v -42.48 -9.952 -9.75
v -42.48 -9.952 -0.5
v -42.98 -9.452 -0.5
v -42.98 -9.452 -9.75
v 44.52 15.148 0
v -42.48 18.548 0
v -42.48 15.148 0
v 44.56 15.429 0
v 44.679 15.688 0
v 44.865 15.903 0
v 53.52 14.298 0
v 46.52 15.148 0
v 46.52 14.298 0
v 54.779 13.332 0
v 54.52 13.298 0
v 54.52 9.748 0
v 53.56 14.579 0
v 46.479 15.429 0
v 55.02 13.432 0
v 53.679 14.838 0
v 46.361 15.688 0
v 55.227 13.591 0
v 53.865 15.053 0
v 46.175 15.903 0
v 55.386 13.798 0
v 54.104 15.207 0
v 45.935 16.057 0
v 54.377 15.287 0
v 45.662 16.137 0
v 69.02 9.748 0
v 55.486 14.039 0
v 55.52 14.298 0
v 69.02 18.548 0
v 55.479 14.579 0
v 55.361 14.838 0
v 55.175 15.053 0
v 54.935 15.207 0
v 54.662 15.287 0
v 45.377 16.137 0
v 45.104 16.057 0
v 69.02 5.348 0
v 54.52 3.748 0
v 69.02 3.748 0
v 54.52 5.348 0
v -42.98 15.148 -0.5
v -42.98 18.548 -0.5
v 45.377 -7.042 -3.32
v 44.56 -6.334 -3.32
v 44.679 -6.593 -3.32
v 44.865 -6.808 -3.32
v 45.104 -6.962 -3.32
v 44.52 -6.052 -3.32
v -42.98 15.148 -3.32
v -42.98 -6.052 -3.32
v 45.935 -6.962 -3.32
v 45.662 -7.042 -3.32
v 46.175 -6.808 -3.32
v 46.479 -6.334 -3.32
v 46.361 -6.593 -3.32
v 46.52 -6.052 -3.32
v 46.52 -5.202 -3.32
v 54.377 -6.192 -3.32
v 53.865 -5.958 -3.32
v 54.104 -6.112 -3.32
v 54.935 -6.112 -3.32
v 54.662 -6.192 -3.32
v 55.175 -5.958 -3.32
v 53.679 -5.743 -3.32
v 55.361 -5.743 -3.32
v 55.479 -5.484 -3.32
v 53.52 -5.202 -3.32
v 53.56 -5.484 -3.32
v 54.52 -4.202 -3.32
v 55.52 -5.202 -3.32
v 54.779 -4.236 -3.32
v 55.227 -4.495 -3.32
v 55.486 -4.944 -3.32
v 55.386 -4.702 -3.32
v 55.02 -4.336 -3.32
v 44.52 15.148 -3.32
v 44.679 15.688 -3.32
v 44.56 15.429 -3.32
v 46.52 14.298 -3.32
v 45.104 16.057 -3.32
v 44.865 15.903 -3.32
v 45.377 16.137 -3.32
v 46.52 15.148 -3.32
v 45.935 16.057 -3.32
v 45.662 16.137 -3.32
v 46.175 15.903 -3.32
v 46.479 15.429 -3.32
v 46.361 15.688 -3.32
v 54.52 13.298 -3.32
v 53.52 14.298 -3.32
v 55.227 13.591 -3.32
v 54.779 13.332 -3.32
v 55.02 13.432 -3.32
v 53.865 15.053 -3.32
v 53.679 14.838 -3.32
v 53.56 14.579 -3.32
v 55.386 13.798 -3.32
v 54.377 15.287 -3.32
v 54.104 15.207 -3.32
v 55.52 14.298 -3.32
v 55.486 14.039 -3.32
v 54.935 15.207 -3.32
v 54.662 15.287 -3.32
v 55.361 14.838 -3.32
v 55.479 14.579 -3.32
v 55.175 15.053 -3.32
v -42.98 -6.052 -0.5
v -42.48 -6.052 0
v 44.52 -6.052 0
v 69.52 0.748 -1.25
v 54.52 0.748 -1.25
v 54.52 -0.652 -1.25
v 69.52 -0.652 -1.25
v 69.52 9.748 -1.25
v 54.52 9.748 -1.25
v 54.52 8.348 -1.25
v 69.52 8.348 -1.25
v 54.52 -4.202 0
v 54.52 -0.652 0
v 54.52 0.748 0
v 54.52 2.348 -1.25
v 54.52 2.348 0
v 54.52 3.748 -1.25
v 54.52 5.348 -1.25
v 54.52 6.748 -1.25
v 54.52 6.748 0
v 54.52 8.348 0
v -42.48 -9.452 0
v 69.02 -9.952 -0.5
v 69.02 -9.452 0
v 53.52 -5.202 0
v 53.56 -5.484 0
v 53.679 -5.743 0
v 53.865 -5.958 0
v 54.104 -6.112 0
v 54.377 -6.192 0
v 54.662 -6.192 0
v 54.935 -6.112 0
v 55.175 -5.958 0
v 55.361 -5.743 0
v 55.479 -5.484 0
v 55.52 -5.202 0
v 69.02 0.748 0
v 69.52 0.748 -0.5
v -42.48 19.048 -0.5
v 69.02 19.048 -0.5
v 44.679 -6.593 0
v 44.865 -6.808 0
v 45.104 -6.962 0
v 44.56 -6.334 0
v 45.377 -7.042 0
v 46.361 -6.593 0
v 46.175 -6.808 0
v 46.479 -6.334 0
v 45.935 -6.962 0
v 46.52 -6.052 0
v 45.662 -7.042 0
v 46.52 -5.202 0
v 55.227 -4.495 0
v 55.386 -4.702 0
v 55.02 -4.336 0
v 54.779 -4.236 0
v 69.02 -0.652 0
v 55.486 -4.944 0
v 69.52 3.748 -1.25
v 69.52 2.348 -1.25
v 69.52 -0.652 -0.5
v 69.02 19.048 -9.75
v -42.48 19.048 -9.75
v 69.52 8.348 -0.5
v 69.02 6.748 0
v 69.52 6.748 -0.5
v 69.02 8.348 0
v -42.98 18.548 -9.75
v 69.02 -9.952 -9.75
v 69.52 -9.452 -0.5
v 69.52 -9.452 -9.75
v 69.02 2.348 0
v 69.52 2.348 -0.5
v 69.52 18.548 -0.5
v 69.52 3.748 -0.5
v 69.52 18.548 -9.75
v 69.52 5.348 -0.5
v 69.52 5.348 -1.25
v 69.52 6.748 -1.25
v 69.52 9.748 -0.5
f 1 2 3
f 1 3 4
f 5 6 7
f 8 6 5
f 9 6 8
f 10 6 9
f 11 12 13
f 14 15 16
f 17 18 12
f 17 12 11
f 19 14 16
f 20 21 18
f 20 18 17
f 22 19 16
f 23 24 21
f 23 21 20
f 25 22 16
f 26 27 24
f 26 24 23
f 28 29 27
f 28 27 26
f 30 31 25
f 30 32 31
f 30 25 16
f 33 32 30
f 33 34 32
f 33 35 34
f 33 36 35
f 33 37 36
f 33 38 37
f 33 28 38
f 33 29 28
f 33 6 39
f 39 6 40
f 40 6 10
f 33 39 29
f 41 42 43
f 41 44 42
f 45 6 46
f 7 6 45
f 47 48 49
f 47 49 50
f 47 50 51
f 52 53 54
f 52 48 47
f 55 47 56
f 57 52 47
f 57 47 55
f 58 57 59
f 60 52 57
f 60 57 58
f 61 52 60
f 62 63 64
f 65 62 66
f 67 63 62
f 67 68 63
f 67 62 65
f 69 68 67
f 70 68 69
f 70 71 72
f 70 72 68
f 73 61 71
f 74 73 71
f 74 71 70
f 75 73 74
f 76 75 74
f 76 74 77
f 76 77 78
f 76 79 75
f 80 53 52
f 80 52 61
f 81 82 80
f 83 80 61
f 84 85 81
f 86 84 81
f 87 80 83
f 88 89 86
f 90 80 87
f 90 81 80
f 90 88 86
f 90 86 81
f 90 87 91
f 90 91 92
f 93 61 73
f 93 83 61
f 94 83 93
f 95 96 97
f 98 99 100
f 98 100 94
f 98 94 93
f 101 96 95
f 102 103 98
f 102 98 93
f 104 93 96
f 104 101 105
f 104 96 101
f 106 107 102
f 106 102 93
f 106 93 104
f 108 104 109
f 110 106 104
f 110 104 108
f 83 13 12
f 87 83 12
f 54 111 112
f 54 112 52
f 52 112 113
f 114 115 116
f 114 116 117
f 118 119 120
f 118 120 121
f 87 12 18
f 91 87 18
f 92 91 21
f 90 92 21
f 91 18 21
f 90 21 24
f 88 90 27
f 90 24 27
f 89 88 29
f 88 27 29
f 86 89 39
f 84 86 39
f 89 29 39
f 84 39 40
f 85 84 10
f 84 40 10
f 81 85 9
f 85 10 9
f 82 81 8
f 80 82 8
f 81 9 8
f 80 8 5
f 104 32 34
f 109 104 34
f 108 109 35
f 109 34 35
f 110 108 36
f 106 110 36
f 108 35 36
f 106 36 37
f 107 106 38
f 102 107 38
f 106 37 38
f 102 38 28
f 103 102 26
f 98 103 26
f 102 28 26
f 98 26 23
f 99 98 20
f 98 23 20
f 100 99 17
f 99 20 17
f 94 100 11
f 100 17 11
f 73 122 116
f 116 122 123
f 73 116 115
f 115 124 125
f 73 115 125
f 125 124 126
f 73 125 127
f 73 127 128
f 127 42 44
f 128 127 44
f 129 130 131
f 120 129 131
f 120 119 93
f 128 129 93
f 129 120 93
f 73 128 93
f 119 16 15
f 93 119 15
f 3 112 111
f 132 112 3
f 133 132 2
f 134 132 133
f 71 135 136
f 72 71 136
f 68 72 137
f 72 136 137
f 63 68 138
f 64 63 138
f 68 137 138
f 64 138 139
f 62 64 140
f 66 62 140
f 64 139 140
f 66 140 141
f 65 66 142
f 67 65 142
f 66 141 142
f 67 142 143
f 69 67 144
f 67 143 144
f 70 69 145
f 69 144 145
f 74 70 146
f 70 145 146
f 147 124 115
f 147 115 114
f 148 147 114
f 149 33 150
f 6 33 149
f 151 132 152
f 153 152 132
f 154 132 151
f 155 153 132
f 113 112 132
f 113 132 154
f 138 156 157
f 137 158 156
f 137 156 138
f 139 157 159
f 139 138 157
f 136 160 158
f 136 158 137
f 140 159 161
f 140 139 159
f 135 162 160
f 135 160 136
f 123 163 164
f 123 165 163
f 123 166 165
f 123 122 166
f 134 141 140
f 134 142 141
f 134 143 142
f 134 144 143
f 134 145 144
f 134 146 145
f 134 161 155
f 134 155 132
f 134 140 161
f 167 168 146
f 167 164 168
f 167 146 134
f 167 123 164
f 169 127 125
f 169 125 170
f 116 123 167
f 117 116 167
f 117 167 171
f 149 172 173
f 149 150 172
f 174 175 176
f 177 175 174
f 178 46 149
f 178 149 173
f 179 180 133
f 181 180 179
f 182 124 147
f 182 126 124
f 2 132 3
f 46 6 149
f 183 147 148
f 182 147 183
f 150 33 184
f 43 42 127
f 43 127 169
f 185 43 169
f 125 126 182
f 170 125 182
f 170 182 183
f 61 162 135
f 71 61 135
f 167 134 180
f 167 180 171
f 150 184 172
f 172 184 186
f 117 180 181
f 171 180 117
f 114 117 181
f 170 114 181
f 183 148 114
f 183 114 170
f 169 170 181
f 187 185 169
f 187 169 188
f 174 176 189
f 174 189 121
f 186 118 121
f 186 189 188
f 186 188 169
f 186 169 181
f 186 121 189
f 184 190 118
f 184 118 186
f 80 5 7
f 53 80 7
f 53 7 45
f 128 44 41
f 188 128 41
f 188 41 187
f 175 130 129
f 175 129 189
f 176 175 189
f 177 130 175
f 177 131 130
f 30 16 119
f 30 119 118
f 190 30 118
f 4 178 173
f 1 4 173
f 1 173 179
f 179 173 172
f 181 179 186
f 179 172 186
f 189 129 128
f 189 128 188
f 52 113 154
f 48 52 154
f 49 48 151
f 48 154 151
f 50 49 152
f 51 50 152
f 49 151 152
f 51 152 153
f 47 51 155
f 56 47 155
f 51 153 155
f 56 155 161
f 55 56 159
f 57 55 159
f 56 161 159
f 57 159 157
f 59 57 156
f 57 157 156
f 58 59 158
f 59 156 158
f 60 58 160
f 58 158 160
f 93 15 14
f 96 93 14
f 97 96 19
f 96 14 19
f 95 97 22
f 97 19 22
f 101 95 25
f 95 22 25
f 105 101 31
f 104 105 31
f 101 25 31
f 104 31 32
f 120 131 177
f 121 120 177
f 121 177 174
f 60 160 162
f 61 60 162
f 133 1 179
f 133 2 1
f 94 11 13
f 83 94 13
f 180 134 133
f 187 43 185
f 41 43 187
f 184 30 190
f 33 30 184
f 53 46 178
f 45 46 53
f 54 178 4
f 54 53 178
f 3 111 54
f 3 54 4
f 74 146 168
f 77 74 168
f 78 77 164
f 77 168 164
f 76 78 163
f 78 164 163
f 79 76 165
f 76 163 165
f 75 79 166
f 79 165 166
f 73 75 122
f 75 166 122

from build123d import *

# Parameters (mm, degrees)
F0_W     = 15
F0_H     = 1.4
F0_H_2   = 1.6
F1_DEPTH = 9.75
F2_SIZE  = 0.5
F3_DEPTH = 3.32
F4_DEPTH = 1.25


with BuildPart() as f1:
    # F0 (on Top) → F1 (new body)
    with BuildSketch(Plane.XY):
        with Locations((62.019782, 3.047612)):
            Rectangle(F0_W, F0_H)
        with Locations((62.019782, 6.047612)):
            Rectangle(F0_W, F0_H)
        with Locations((62.019782, 0.047612)):
            Rectangle(F0_W, F0_H)
        with Locations((62.019782, 9.047612)):
            Rectangle(F0_W, F0_H)
        with Locations((62.019782, 4.547612)):
            Rectangle(F0_W, F0_H_2)
        with Locations((62.019782, 1.547612)):
            Rectangle(F0_W, F0_H_2)
        with Locations((62.019782, 7.547612)):
            Rectangle(F0_W, F0_H_2)
        with BuildLine():
            Line((44.519782, 15.147612), (-42.980218, 15.147612))
            Line((-42.980218, 15.147612), (-42.980218, -6.052388))
            Line((-42.980218, -6.052388), (44.519782, -6.052388))
            Line((44.519782, -6.052388), (46.519782, -6.052388))
            Line((46.519782, -6.052388), (46.519782, -5.202388))
            Line((46.519782, -5.202388), (53.519782, -5.202388))
            ThreePointArc((53.519782, -5.202388), (53.812675, -4.495281), (54.519782, -4.202388))
            Line((54.519782, -4.202388), (54.519782, -0.652388))
            Line((54.519782, -0.652388), (54.519782, 0.747612))
            Line((54.519782, 0.747612), (54.519782, 2.347612))
            Line((54.519782, 2.347612), (54.519782, 3.747612))
            Line((54.519782, 3.747612), (54.519782, 5.347612))
            Line((54.519782, 5.347612), (54.519782, 6.747612))
            Line((54.519782, 6.747612), (54.519782, 8.347612))
            Line((54.519782, 8.347612), (54.519782, 9.747612))
            Line((54.519782, 9.747612), (54.519782, 13.297612))
            ThreePointArc((54.519782, 13.297612), (53.812675, 13.590505), (53.519782, 14.297612))
            Line((53.519782, 14.297612), (46.519782, 14.297612))
            Line((46.519782, 14.297612), (46.519782, 15.147612))
            Line((46.519782, 15.147612), (44.519782, 15.147612))
        make_face()
        with BuildLine():
            Line((46.519782, -6.052388), (44.519782, -6.052388))
            ThreePointArc((44.519782, -6.052388), (45.519782, -7.052388), (46.519782, -6.052388))
        make_face()
        with BuildLine():
            ThreePointArc((46.519782, 15.147612), (45.519782, 16.147612), (44.519782, 15.147612))
            Line((44.519782, 15.147612), (46.519782, 15.147612))
        make_face()
        with BuildLine():
            Line((69.519782, 19.047612), (-42.980218, 19.047612))
            Line((-42.980218, 19.047612), (-42.980218, 15.147612))
            Line((-42.980218, 15.147612), (44.519782, 15.147612))
            ThreePointArc((44.519782, 15.147612), (45.519782, 16.147612), (46.519782, 15.147612))
            Line((46.519782, 15.147612), (46.519782, 14.297612))
            Line((46.519782, 14.297612), (53.519782, 14.297612))
            ThreePointArc((53.519782, 14.297612), (54.519782, 15.297612), (55.519782, 14.297612))
            ThreePointArc((55.519782, 14.297612), (55.226889, 13.590505), (54.519782, 13.297612))
            Line((54.519782, 13.297612), (54.519782, 9.747612))
            Line((54.519782, 9.747612), (69.519782, 9.747612))
            Line((69.519782, 9.747612), (69.519782, 19.047612))
        make_face()
        with BuildLine():
            Line((44.519782, -6.052388), (-42.980218, -6.052388))
            Line((-42.980218, -6.052388), (-42.980218, -9.952388))
            Line((-42.980218, -9.952388), (69.519782, -9.952388))
            Line((69.519782, -9.952388), (69.519782, -0.652388))
            Line((69.519782, -0.652388), (54.519782, -0.652388))
            Line((54.519782, -0.652388), (54.519782, -4.202388))
            ThreePointArc((54.519782, -4.202388), (55.226889, -4.495281), (55.519782, -5.202388))
            ThreePointArc((55.519782, -5.202388), (54.519782, -6.202388), (53.519782, -5.202388))
            Line((53.519782, -5.202388), (46.519782, -5.202388))
            Line((46.519782, -5.202388), (46.519782, -6.052388))
            ThreePointArc((46.519782, -6.052388), (45.519782, -7.052388), (44.519782, -6.052388))
        make_face()
        with BuildLine():
            Line((54.519782, -5.202388), (53.519782, -5.202388))
            ThreePointArc((53.519782, -5.202388), (54.519782, -6.202388), (55.519782, -5.202388))
            ThreePointArc((55.519782, -5.202388), (55.226889, -4.495281), (54.519782, -4.202388))
            Line((54.519782, -4.202388), (54.519782, -5.202388))
        make_face()
        with BuildLine():
            ThreePointArc((54.519782, -4.202388), (53.812675, -4.495281), (53.519782, -5.202388))
            Line((53.519782, -5.202388), (54.519782, -5.202388))
            Line((54.519782, -5.202388), (54.519782, -4.202388))
        make_face()
        with BuildLine():
            Line((54.519782, 14.297612), (54.519782, 13.297612))
            ThreePointArc((54.519782, 13.297612), (55.226889, 13.590505), (55.519782, 14.297612))
            ThreePointArc((55.519782, 14.297612), (54.519782, 15.297612), (53.519782, 14.297612))
            Line((53.519782, 14.297612), (54.519782, 14.297612))
        make_face()
        with BuildLine():
            ThreePointArc((53.519782, 14.297612), (53.812675, 13.590505), (54.519782, 13.297612))
            Line((54.519782, 13.297612), (54.519782, 14.297612))
            Line((54.519782, 14.297612), (53.519782, 14.297612))
        make_face()
    extrude(amount=-F1_DEPTH)

    # F2
    f2_edges = [f1.edges().sort_by_distance(p)[0] for p in [
        (13.269782, 19.047612, 0),
        (-42.980218, 4.547612, 0),
        (13.269782, -9.952388, 0),
        (69.519782, 4.547612, 0),
        (-42.980218, 19.047612, -4.875),
        (-42.980218, -9.952388, -4.875),
        (69.519782, 19.047612, -4.875),
        (69.519782, -9.952388, -4.875),
    ]]
    chamfer(f2_edges, length=F2_SIZE)

    # F0 (on Top) → F3 (cut)
    with BuildSketch(Plane.XY):
        with BuildLine():
            Line((44.519782, 15.147612), (-42.980218, 15.147612))
            Line((-42.980218, 15.147612), (-42.980218, -6.052388))
            Line((-42.980218, -6.052388), (44.519782, -6.052388))
            Line((44.519782, -6.052388), (46.519782, -6.052388))
            Line((46.519782, -6.052388), (46.519782, -5.202388))
            Line((46.519782, -5.202388), (53.519782, -5.202388))
            ThreePointArc((53.519782, -5.202388), (53.812675, -4.495281), (54.519782, -4.202388))
            Line((54.519782, -4.202388), (54.519782, -0.652388))
            Line((54.519782, -0.652388), (54.519782, 0.747612))
            Line((54.519782, 0.747612), (54.519782, 2.347612))
            Line((54.519782, 2.347612), (54.519782, 3.747612))
            Line((54.519782, 3.747612), (54.519782, 5.347612))
            Line((54.519782, 5.347612), (54.519782, 6.747612))
            Line((54.519782, 6.747612), (54.519782, 8.347612))
            Line((54.519782, 8.347612), (54.519782, 9.747612))
            Line((54.519782, 9.747612), (54.519782, 13.297612))
            ThreePointArc((54.519782, 13.297612), (53.812675, 13.590505), (53.519782, 14.297612))
            Line((53.519782, 14.297612), (46.519782, 14.297612))
            Line((46.519782, 14.297612), (46.519782, 15.147612))
            Line((46.519782, 15.147612), (44.519782, 15.147612))
        make_face()
        with BuildLine():
            Line((46.519782, -6.052388), (44.519782, -6.052388))
            ThreePointArc((44.519782, -6.052388), (45.519782, -7.052388), (46.519782, -6.052388))
        make_face()
        with BuildLine():
            ThreePointArc((54.519782, -4.202388), (53.812675, -4.495281), (53.519782, -5.202388))
            Line((53.519782, -5.202388), (54.519782, -5.202388))
            Line((54.519782, -5.202388), (54.519782, -4.202388))
        make_face()
        with BuildLine():
            Line((54.519782, -5.202388), (53.519782, -5.202388))
            ThreePointArc((53.519782, -5.202388), (54.519782, -6.202388), (55.519782, -5.202388))
            ThreePointArc((55.519782, -5.202388), (55.226889, -4.495281), (54.519782, -4.202388))
            Line((54.519782, -4.202388), (54.519782, -5.202388))
        make_face()
        with BuildLine():
            ThreePointArc((53.519782, 14.297612), (53.812675, 13.590505), (54.519782, 13.297612))
            Line((54.519782, 13.297612), (54.519782, 14.297612))
            Line((54.519782, 14.297612), (53.519782, 14.297612))
        make_face()
        with BuildLine():
            Line((54.519782, 14.297612), (54.519782, 13.297612))
            ThreePointArc((54.519782, 13.297612), (55.226889, 13.590505), (55.519782, 14.297612))
            ThreePointArc((55.519782, 14.297612), (54.519782, 15.297612), (53.519782, 14.297612))
            Line((53.519782, 14.297612), (54.519782, 14.297612))
        make_face()
        with BuildLine():
            ThreePointArc((46.519782, 15.147612), (45.519782, 16.147612), (44.519782, 15.147612))
            Line((44.519782, 15.147612), (46.519782, 15.147612))
        make_face()
    extrude(amount=-F3_DEPTH, mode=Mode.SUBTRACT)

    # F0 (on Top) → F4 (cut)
    with BuildSketch(Plane.XY):
        with Locations((62.019782, 9.047612)):
            Rectangle(F0_W, F0_H)
        with Locations((62.019782, 6.047612)):
            Rectangle(F0_W, F0_H)
        with Locations((62.019782, 3.047612)):
            Rectangle(F0_W, F0_H)
        with Locations((62.019782, 0.047612)):
            Rectangle(F0_W, F0_H)
    extrude(amount=-F4_DEPTH, mode=Mode.SUBTRACT)


solid = f1.part
